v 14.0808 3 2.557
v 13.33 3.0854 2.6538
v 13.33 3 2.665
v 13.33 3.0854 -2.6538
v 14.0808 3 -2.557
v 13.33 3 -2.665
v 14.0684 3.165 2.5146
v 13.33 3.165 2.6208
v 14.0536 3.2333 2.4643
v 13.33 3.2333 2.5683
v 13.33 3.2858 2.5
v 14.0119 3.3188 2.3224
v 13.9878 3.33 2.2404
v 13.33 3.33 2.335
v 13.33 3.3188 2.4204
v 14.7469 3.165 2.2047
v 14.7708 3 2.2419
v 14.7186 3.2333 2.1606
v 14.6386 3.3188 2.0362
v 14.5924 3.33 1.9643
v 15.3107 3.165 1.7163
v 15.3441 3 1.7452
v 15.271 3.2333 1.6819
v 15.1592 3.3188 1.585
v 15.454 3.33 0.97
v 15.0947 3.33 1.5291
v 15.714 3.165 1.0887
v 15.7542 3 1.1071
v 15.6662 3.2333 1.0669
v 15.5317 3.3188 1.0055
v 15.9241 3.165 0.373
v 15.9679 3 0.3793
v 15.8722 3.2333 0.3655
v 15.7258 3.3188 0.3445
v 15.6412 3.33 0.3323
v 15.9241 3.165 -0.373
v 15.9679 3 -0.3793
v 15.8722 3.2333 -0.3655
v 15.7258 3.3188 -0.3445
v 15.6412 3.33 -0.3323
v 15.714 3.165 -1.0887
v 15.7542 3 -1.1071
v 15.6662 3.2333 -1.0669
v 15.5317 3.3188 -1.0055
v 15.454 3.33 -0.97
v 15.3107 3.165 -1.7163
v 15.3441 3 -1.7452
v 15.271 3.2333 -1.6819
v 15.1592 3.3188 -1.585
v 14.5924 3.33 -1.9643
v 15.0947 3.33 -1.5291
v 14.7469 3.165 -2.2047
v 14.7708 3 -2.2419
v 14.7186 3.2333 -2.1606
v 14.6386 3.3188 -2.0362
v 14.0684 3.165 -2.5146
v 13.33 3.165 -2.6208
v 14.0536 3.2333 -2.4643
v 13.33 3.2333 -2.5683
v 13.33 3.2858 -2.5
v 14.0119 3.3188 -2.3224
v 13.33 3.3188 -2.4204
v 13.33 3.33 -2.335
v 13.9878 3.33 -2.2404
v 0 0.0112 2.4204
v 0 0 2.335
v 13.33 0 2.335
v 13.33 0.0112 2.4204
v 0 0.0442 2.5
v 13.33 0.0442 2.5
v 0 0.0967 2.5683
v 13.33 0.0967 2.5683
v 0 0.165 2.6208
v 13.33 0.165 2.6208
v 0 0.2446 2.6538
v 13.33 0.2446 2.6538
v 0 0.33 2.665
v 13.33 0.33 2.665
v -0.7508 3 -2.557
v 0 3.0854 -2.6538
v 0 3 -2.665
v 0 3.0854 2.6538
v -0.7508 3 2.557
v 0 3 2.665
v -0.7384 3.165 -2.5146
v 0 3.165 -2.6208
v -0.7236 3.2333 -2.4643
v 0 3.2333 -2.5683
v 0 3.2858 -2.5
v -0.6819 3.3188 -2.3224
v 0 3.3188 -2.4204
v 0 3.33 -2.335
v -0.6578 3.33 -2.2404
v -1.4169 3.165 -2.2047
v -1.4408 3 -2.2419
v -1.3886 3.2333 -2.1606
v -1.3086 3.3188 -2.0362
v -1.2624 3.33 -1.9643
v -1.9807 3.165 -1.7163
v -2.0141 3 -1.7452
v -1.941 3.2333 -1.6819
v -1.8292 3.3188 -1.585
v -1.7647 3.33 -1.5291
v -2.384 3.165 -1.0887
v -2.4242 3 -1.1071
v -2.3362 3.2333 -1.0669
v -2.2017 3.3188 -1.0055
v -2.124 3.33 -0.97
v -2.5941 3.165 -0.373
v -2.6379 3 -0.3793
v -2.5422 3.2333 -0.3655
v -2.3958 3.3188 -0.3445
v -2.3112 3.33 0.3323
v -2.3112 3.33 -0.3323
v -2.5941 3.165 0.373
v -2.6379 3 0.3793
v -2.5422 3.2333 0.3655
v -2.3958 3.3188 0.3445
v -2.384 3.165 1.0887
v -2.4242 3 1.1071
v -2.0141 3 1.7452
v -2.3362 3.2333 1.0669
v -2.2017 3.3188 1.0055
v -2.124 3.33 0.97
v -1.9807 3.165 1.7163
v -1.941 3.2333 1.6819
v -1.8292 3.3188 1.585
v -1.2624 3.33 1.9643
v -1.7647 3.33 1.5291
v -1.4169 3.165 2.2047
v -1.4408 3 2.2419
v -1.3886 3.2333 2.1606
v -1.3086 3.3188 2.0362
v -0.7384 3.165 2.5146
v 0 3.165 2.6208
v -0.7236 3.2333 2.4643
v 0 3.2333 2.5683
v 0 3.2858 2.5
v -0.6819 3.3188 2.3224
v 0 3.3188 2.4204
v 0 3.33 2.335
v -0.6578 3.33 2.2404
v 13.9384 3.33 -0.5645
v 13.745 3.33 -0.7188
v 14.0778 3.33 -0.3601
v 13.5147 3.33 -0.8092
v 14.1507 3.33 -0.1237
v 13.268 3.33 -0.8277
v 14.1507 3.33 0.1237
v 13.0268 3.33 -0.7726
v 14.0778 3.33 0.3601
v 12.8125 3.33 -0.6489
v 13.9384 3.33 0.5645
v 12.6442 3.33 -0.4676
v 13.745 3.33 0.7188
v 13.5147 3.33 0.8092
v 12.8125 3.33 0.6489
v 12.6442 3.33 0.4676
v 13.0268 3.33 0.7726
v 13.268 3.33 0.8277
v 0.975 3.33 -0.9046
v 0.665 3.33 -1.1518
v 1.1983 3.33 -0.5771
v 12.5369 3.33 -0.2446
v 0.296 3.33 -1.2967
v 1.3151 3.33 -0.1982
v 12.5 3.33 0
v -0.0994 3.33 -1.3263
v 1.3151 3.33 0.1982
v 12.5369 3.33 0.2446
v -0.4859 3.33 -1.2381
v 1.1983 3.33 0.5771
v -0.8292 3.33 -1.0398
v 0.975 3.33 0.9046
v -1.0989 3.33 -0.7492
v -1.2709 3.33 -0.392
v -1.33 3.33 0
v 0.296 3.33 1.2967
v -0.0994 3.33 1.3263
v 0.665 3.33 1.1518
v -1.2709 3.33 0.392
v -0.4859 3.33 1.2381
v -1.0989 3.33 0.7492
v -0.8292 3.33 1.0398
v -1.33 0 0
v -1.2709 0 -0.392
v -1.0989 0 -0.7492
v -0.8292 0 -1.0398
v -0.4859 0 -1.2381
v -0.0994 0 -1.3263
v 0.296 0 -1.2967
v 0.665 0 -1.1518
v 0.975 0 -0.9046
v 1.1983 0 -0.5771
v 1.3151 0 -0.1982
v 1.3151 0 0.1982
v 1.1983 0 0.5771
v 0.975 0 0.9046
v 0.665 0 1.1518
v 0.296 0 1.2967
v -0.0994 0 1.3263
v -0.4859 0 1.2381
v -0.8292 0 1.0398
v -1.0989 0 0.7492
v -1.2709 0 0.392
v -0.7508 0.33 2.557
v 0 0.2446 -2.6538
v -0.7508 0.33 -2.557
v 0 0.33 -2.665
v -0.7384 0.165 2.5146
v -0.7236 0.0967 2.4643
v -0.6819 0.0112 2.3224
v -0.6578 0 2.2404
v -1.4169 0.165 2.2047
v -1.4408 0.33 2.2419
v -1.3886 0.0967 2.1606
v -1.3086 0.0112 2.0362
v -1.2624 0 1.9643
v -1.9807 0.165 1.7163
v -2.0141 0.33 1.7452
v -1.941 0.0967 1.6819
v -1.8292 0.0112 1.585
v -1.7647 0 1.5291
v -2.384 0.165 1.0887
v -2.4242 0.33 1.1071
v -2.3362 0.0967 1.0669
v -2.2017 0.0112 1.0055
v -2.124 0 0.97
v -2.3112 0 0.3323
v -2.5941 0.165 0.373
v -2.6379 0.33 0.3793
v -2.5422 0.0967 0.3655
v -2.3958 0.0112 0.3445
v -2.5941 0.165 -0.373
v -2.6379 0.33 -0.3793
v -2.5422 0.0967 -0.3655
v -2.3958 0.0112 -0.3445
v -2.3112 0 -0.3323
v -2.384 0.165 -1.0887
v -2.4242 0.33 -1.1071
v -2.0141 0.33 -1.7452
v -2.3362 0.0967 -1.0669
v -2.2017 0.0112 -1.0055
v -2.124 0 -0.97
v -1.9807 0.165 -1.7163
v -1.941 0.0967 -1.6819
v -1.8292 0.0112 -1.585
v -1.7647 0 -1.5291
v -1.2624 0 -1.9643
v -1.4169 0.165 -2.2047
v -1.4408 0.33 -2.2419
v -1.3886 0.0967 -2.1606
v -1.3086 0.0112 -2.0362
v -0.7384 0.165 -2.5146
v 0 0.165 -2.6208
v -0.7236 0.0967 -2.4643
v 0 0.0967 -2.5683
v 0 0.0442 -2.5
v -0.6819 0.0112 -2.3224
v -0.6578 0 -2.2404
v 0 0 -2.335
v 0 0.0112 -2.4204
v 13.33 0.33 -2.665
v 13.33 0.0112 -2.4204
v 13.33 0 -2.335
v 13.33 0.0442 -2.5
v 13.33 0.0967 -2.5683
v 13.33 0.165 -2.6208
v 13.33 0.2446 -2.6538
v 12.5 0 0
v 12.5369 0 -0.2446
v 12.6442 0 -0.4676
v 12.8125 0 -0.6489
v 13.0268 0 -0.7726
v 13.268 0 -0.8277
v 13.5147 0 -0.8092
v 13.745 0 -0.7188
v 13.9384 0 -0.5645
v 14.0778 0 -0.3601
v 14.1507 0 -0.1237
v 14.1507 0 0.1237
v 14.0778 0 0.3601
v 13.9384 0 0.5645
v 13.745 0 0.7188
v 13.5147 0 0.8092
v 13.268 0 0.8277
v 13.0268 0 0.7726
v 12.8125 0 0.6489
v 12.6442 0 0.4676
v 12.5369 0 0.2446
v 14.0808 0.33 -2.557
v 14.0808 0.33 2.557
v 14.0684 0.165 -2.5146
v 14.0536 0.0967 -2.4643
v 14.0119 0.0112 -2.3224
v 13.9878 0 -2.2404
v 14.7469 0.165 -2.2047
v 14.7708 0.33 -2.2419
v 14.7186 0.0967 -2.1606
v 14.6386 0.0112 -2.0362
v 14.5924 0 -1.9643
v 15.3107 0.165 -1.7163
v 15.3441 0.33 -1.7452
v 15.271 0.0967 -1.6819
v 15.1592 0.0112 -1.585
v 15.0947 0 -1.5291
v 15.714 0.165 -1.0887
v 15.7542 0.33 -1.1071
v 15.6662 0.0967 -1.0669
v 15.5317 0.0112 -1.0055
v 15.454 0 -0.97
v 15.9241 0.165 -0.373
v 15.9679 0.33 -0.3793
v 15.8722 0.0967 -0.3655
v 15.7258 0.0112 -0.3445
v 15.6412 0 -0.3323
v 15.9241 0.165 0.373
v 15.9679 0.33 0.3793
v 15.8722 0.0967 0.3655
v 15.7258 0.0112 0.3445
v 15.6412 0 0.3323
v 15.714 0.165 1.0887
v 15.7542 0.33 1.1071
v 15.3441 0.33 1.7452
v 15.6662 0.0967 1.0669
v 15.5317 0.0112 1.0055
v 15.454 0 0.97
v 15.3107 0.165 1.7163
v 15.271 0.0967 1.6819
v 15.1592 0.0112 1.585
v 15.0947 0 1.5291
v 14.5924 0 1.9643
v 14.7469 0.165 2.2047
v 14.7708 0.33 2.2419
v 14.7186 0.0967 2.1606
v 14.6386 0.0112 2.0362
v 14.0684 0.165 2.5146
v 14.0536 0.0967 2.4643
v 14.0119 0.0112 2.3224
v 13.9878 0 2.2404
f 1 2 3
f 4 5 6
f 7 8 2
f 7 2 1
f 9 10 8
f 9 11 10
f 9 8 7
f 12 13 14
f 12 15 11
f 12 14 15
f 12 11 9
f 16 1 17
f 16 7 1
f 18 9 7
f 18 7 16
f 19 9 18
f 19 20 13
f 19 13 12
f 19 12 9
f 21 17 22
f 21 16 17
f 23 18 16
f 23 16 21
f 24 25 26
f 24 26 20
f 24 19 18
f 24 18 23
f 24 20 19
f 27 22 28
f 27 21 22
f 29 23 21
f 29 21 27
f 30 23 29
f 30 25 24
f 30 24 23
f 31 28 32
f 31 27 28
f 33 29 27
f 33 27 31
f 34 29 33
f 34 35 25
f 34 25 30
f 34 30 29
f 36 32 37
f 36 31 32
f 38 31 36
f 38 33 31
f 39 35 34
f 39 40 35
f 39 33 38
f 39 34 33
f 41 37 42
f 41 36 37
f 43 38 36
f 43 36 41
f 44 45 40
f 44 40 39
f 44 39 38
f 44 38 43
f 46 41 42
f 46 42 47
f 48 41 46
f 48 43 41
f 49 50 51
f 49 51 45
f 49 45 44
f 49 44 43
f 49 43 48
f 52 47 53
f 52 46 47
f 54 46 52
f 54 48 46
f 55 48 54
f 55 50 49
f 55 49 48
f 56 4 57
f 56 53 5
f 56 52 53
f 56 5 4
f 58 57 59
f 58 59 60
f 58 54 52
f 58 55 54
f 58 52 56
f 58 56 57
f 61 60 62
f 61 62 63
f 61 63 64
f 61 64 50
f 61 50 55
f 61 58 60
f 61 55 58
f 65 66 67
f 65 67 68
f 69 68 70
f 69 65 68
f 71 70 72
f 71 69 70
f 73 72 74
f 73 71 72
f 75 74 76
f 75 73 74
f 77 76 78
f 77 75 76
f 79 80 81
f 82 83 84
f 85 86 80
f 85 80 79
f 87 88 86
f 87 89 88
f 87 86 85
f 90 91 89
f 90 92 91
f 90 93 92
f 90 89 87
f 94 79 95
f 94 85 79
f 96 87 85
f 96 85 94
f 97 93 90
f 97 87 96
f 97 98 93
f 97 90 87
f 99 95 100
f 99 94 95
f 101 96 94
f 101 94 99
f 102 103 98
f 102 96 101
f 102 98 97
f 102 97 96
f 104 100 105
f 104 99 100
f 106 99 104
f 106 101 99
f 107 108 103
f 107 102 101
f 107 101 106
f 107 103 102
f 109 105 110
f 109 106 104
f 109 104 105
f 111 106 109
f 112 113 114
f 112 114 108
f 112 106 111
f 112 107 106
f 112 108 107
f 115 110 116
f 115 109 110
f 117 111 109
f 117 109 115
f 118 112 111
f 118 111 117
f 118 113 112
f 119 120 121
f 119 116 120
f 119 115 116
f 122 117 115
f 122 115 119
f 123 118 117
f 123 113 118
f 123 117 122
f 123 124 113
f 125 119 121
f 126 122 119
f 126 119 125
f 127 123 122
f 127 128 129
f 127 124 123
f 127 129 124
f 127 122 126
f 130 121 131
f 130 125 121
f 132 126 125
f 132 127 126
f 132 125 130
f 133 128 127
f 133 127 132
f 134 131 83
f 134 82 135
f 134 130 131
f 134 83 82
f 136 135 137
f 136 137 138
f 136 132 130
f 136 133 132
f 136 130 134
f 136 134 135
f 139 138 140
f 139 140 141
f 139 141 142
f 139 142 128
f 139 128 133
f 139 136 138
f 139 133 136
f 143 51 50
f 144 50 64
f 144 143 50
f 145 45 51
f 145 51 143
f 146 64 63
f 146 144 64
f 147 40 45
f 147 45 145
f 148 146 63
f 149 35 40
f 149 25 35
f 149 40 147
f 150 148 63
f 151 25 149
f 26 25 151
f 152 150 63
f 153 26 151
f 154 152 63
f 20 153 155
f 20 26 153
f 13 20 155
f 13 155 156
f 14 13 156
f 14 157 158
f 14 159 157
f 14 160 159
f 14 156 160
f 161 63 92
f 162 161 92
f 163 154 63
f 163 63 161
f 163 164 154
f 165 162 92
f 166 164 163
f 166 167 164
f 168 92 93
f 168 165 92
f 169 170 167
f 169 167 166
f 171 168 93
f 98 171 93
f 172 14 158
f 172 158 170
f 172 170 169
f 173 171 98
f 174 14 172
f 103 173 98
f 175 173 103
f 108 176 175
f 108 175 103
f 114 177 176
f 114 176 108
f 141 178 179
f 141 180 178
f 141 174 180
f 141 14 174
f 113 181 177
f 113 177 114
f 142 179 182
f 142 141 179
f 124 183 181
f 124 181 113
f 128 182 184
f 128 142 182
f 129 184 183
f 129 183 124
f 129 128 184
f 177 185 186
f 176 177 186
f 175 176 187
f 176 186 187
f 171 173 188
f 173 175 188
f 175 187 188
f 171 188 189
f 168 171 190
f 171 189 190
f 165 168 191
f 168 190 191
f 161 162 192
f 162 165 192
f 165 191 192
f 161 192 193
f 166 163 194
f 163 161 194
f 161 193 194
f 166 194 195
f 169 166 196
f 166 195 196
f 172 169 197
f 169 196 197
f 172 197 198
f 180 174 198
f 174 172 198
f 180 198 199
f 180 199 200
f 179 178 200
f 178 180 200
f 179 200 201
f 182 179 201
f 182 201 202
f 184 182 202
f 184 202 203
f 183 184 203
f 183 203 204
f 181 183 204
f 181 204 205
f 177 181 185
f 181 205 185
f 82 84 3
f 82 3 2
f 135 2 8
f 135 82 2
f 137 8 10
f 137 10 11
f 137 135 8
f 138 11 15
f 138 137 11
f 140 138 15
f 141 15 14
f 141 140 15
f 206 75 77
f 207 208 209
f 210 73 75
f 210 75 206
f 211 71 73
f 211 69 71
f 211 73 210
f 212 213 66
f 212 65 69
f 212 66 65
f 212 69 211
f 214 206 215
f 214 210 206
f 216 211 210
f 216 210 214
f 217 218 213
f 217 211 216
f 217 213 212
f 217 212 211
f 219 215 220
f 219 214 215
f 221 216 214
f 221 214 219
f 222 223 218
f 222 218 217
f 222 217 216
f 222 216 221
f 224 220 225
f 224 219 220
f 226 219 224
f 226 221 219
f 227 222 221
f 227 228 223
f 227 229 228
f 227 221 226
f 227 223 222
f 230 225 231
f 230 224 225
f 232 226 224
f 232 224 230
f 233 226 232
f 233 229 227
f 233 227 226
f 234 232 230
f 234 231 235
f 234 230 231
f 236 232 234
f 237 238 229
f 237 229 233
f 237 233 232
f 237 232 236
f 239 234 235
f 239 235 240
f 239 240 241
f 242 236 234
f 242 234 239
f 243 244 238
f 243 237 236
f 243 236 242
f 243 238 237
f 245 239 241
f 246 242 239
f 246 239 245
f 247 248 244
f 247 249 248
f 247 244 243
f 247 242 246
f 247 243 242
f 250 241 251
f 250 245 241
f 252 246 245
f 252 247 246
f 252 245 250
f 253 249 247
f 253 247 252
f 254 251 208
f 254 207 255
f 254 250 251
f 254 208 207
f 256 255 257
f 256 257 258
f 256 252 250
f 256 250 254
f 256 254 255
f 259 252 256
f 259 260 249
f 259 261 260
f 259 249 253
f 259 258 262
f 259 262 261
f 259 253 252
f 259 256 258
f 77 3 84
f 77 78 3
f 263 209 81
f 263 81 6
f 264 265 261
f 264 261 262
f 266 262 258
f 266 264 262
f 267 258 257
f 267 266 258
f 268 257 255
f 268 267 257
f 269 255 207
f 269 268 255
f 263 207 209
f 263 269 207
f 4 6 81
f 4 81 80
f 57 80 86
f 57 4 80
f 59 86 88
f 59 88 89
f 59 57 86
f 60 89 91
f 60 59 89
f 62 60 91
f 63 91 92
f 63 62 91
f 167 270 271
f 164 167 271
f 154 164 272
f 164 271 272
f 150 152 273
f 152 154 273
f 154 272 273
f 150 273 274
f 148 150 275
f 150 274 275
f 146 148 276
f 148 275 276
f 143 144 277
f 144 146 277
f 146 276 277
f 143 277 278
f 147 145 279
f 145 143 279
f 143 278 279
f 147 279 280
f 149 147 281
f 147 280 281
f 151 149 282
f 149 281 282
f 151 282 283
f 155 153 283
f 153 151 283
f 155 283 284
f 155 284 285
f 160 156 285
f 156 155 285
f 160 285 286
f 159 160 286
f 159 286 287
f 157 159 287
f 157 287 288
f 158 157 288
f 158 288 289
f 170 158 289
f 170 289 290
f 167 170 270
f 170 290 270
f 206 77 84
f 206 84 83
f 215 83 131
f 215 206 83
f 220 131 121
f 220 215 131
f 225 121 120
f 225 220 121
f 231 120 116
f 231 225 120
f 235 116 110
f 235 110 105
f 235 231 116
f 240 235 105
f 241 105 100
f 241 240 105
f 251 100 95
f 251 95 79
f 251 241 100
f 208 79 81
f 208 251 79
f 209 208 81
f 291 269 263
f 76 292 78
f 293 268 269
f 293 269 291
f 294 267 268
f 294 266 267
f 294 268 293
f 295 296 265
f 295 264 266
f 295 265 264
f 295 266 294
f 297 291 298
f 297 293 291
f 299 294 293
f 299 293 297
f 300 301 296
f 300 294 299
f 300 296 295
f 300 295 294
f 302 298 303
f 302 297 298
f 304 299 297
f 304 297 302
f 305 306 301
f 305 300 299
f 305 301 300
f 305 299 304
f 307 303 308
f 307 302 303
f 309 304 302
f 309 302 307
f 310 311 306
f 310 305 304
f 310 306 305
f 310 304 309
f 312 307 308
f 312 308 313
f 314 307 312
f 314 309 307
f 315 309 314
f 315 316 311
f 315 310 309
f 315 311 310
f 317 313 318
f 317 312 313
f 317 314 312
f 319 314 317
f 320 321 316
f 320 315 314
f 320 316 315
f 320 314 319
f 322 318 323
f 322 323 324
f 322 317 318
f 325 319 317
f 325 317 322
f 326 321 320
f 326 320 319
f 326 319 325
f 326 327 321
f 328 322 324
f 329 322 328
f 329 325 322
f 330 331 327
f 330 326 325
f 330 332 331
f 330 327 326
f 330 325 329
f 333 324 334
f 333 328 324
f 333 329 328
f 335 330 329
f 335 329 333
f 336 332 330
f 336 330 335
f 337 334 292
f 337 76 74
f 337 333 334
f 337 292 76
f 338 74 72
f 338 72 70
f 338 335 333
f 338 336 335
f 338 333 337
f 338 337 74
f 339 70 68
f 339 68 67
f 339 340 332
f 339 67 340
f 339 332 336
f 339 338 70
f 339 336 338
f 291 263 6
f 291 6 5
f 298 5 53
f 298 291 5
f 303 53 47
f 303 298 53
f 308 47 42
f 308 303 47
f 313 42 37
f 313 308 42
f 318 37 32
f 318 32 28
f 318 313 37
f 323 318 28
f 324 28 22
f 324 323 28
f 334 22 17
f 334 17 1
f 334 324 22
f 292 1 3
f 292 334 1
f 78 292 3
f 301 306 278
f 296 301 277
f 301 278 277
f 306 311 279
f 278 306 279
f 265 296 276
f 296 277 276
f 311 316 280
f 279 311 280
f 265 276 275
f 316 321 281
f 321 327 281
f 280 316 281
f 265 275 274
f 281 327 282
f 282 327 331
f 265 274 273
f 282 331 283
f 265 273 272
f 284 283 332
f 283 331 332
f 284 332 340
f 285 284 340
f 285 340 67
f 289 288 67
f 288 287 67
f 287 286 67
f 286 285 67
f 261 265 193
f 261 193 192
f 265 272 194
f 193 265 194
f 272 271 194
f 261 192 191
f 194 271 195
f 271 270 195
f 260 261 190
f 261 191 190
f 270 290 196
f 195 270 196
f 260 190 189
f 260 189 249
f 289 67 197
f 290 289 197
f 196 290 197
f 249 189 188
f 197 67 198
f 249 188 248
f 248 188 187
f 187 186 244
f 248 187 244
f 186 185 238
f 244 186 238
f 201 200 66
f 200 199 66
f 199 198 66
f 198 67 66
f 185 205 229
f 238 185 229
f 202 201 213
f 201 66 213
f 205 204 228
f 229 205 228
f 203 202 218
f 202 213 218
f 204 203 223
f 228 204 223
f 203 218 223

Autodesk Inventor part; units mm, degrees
ref_plane "YZ Plane" through (0, 0, 0) normal (1, 0, 0) x (0, 1, 0)
ref_plane "XZ Plane" through (0, 0, 0) normal (0, 1, 0) x (-1, 0, 0)
ref_plane "XY Plane" through (0, 0, 0) normal (0, 0, 1) x (1, 0, 0)
sketch "Sketch1" plane through (0, 0, 0) normal (0, 1, 0) x (-1, 0, 0)
  line L0 (0, 0) -> (-13.33, 0) construction
  line L1 (0, -2.665) -> (-13.33, -2.665)
  line L2 (-13.33, 2.665) -> (0, 2.665)
  arc A0 (0, -2.665) -> (0, 2.665) centre (0, 0) ccw
  arc A1 (-13.33, 2.665) -> (-13.33, -2.665) centre (-13.33, 0) ccw
  circle A2 centre (-13.33, 0) radius 0.83
  circle A3 centre (0, 0) radius 1.33
  point P0 (-6.665, 0)
  dimension "d0" = 5.33
  dimension "d1" = 13.33
  dimension "d2" = 2.66
  dimension "d3" = 1.66
extrude "Extrusion1" add sketch "Sketch1" along normal blind 3.33
fillet "Fillet1" radius 0.33 8 edges at (6.665, 0, -2.665) (6.665, 3.33, -2.665) (-2.665, 0, 0) (6.665, 0, 2.665) (15.995, 0, 0) (-2.665, 3.33, 0) (6.665, 3.33, 2.665) (15.995, 3.33, 0)
properties part number "G-5"
